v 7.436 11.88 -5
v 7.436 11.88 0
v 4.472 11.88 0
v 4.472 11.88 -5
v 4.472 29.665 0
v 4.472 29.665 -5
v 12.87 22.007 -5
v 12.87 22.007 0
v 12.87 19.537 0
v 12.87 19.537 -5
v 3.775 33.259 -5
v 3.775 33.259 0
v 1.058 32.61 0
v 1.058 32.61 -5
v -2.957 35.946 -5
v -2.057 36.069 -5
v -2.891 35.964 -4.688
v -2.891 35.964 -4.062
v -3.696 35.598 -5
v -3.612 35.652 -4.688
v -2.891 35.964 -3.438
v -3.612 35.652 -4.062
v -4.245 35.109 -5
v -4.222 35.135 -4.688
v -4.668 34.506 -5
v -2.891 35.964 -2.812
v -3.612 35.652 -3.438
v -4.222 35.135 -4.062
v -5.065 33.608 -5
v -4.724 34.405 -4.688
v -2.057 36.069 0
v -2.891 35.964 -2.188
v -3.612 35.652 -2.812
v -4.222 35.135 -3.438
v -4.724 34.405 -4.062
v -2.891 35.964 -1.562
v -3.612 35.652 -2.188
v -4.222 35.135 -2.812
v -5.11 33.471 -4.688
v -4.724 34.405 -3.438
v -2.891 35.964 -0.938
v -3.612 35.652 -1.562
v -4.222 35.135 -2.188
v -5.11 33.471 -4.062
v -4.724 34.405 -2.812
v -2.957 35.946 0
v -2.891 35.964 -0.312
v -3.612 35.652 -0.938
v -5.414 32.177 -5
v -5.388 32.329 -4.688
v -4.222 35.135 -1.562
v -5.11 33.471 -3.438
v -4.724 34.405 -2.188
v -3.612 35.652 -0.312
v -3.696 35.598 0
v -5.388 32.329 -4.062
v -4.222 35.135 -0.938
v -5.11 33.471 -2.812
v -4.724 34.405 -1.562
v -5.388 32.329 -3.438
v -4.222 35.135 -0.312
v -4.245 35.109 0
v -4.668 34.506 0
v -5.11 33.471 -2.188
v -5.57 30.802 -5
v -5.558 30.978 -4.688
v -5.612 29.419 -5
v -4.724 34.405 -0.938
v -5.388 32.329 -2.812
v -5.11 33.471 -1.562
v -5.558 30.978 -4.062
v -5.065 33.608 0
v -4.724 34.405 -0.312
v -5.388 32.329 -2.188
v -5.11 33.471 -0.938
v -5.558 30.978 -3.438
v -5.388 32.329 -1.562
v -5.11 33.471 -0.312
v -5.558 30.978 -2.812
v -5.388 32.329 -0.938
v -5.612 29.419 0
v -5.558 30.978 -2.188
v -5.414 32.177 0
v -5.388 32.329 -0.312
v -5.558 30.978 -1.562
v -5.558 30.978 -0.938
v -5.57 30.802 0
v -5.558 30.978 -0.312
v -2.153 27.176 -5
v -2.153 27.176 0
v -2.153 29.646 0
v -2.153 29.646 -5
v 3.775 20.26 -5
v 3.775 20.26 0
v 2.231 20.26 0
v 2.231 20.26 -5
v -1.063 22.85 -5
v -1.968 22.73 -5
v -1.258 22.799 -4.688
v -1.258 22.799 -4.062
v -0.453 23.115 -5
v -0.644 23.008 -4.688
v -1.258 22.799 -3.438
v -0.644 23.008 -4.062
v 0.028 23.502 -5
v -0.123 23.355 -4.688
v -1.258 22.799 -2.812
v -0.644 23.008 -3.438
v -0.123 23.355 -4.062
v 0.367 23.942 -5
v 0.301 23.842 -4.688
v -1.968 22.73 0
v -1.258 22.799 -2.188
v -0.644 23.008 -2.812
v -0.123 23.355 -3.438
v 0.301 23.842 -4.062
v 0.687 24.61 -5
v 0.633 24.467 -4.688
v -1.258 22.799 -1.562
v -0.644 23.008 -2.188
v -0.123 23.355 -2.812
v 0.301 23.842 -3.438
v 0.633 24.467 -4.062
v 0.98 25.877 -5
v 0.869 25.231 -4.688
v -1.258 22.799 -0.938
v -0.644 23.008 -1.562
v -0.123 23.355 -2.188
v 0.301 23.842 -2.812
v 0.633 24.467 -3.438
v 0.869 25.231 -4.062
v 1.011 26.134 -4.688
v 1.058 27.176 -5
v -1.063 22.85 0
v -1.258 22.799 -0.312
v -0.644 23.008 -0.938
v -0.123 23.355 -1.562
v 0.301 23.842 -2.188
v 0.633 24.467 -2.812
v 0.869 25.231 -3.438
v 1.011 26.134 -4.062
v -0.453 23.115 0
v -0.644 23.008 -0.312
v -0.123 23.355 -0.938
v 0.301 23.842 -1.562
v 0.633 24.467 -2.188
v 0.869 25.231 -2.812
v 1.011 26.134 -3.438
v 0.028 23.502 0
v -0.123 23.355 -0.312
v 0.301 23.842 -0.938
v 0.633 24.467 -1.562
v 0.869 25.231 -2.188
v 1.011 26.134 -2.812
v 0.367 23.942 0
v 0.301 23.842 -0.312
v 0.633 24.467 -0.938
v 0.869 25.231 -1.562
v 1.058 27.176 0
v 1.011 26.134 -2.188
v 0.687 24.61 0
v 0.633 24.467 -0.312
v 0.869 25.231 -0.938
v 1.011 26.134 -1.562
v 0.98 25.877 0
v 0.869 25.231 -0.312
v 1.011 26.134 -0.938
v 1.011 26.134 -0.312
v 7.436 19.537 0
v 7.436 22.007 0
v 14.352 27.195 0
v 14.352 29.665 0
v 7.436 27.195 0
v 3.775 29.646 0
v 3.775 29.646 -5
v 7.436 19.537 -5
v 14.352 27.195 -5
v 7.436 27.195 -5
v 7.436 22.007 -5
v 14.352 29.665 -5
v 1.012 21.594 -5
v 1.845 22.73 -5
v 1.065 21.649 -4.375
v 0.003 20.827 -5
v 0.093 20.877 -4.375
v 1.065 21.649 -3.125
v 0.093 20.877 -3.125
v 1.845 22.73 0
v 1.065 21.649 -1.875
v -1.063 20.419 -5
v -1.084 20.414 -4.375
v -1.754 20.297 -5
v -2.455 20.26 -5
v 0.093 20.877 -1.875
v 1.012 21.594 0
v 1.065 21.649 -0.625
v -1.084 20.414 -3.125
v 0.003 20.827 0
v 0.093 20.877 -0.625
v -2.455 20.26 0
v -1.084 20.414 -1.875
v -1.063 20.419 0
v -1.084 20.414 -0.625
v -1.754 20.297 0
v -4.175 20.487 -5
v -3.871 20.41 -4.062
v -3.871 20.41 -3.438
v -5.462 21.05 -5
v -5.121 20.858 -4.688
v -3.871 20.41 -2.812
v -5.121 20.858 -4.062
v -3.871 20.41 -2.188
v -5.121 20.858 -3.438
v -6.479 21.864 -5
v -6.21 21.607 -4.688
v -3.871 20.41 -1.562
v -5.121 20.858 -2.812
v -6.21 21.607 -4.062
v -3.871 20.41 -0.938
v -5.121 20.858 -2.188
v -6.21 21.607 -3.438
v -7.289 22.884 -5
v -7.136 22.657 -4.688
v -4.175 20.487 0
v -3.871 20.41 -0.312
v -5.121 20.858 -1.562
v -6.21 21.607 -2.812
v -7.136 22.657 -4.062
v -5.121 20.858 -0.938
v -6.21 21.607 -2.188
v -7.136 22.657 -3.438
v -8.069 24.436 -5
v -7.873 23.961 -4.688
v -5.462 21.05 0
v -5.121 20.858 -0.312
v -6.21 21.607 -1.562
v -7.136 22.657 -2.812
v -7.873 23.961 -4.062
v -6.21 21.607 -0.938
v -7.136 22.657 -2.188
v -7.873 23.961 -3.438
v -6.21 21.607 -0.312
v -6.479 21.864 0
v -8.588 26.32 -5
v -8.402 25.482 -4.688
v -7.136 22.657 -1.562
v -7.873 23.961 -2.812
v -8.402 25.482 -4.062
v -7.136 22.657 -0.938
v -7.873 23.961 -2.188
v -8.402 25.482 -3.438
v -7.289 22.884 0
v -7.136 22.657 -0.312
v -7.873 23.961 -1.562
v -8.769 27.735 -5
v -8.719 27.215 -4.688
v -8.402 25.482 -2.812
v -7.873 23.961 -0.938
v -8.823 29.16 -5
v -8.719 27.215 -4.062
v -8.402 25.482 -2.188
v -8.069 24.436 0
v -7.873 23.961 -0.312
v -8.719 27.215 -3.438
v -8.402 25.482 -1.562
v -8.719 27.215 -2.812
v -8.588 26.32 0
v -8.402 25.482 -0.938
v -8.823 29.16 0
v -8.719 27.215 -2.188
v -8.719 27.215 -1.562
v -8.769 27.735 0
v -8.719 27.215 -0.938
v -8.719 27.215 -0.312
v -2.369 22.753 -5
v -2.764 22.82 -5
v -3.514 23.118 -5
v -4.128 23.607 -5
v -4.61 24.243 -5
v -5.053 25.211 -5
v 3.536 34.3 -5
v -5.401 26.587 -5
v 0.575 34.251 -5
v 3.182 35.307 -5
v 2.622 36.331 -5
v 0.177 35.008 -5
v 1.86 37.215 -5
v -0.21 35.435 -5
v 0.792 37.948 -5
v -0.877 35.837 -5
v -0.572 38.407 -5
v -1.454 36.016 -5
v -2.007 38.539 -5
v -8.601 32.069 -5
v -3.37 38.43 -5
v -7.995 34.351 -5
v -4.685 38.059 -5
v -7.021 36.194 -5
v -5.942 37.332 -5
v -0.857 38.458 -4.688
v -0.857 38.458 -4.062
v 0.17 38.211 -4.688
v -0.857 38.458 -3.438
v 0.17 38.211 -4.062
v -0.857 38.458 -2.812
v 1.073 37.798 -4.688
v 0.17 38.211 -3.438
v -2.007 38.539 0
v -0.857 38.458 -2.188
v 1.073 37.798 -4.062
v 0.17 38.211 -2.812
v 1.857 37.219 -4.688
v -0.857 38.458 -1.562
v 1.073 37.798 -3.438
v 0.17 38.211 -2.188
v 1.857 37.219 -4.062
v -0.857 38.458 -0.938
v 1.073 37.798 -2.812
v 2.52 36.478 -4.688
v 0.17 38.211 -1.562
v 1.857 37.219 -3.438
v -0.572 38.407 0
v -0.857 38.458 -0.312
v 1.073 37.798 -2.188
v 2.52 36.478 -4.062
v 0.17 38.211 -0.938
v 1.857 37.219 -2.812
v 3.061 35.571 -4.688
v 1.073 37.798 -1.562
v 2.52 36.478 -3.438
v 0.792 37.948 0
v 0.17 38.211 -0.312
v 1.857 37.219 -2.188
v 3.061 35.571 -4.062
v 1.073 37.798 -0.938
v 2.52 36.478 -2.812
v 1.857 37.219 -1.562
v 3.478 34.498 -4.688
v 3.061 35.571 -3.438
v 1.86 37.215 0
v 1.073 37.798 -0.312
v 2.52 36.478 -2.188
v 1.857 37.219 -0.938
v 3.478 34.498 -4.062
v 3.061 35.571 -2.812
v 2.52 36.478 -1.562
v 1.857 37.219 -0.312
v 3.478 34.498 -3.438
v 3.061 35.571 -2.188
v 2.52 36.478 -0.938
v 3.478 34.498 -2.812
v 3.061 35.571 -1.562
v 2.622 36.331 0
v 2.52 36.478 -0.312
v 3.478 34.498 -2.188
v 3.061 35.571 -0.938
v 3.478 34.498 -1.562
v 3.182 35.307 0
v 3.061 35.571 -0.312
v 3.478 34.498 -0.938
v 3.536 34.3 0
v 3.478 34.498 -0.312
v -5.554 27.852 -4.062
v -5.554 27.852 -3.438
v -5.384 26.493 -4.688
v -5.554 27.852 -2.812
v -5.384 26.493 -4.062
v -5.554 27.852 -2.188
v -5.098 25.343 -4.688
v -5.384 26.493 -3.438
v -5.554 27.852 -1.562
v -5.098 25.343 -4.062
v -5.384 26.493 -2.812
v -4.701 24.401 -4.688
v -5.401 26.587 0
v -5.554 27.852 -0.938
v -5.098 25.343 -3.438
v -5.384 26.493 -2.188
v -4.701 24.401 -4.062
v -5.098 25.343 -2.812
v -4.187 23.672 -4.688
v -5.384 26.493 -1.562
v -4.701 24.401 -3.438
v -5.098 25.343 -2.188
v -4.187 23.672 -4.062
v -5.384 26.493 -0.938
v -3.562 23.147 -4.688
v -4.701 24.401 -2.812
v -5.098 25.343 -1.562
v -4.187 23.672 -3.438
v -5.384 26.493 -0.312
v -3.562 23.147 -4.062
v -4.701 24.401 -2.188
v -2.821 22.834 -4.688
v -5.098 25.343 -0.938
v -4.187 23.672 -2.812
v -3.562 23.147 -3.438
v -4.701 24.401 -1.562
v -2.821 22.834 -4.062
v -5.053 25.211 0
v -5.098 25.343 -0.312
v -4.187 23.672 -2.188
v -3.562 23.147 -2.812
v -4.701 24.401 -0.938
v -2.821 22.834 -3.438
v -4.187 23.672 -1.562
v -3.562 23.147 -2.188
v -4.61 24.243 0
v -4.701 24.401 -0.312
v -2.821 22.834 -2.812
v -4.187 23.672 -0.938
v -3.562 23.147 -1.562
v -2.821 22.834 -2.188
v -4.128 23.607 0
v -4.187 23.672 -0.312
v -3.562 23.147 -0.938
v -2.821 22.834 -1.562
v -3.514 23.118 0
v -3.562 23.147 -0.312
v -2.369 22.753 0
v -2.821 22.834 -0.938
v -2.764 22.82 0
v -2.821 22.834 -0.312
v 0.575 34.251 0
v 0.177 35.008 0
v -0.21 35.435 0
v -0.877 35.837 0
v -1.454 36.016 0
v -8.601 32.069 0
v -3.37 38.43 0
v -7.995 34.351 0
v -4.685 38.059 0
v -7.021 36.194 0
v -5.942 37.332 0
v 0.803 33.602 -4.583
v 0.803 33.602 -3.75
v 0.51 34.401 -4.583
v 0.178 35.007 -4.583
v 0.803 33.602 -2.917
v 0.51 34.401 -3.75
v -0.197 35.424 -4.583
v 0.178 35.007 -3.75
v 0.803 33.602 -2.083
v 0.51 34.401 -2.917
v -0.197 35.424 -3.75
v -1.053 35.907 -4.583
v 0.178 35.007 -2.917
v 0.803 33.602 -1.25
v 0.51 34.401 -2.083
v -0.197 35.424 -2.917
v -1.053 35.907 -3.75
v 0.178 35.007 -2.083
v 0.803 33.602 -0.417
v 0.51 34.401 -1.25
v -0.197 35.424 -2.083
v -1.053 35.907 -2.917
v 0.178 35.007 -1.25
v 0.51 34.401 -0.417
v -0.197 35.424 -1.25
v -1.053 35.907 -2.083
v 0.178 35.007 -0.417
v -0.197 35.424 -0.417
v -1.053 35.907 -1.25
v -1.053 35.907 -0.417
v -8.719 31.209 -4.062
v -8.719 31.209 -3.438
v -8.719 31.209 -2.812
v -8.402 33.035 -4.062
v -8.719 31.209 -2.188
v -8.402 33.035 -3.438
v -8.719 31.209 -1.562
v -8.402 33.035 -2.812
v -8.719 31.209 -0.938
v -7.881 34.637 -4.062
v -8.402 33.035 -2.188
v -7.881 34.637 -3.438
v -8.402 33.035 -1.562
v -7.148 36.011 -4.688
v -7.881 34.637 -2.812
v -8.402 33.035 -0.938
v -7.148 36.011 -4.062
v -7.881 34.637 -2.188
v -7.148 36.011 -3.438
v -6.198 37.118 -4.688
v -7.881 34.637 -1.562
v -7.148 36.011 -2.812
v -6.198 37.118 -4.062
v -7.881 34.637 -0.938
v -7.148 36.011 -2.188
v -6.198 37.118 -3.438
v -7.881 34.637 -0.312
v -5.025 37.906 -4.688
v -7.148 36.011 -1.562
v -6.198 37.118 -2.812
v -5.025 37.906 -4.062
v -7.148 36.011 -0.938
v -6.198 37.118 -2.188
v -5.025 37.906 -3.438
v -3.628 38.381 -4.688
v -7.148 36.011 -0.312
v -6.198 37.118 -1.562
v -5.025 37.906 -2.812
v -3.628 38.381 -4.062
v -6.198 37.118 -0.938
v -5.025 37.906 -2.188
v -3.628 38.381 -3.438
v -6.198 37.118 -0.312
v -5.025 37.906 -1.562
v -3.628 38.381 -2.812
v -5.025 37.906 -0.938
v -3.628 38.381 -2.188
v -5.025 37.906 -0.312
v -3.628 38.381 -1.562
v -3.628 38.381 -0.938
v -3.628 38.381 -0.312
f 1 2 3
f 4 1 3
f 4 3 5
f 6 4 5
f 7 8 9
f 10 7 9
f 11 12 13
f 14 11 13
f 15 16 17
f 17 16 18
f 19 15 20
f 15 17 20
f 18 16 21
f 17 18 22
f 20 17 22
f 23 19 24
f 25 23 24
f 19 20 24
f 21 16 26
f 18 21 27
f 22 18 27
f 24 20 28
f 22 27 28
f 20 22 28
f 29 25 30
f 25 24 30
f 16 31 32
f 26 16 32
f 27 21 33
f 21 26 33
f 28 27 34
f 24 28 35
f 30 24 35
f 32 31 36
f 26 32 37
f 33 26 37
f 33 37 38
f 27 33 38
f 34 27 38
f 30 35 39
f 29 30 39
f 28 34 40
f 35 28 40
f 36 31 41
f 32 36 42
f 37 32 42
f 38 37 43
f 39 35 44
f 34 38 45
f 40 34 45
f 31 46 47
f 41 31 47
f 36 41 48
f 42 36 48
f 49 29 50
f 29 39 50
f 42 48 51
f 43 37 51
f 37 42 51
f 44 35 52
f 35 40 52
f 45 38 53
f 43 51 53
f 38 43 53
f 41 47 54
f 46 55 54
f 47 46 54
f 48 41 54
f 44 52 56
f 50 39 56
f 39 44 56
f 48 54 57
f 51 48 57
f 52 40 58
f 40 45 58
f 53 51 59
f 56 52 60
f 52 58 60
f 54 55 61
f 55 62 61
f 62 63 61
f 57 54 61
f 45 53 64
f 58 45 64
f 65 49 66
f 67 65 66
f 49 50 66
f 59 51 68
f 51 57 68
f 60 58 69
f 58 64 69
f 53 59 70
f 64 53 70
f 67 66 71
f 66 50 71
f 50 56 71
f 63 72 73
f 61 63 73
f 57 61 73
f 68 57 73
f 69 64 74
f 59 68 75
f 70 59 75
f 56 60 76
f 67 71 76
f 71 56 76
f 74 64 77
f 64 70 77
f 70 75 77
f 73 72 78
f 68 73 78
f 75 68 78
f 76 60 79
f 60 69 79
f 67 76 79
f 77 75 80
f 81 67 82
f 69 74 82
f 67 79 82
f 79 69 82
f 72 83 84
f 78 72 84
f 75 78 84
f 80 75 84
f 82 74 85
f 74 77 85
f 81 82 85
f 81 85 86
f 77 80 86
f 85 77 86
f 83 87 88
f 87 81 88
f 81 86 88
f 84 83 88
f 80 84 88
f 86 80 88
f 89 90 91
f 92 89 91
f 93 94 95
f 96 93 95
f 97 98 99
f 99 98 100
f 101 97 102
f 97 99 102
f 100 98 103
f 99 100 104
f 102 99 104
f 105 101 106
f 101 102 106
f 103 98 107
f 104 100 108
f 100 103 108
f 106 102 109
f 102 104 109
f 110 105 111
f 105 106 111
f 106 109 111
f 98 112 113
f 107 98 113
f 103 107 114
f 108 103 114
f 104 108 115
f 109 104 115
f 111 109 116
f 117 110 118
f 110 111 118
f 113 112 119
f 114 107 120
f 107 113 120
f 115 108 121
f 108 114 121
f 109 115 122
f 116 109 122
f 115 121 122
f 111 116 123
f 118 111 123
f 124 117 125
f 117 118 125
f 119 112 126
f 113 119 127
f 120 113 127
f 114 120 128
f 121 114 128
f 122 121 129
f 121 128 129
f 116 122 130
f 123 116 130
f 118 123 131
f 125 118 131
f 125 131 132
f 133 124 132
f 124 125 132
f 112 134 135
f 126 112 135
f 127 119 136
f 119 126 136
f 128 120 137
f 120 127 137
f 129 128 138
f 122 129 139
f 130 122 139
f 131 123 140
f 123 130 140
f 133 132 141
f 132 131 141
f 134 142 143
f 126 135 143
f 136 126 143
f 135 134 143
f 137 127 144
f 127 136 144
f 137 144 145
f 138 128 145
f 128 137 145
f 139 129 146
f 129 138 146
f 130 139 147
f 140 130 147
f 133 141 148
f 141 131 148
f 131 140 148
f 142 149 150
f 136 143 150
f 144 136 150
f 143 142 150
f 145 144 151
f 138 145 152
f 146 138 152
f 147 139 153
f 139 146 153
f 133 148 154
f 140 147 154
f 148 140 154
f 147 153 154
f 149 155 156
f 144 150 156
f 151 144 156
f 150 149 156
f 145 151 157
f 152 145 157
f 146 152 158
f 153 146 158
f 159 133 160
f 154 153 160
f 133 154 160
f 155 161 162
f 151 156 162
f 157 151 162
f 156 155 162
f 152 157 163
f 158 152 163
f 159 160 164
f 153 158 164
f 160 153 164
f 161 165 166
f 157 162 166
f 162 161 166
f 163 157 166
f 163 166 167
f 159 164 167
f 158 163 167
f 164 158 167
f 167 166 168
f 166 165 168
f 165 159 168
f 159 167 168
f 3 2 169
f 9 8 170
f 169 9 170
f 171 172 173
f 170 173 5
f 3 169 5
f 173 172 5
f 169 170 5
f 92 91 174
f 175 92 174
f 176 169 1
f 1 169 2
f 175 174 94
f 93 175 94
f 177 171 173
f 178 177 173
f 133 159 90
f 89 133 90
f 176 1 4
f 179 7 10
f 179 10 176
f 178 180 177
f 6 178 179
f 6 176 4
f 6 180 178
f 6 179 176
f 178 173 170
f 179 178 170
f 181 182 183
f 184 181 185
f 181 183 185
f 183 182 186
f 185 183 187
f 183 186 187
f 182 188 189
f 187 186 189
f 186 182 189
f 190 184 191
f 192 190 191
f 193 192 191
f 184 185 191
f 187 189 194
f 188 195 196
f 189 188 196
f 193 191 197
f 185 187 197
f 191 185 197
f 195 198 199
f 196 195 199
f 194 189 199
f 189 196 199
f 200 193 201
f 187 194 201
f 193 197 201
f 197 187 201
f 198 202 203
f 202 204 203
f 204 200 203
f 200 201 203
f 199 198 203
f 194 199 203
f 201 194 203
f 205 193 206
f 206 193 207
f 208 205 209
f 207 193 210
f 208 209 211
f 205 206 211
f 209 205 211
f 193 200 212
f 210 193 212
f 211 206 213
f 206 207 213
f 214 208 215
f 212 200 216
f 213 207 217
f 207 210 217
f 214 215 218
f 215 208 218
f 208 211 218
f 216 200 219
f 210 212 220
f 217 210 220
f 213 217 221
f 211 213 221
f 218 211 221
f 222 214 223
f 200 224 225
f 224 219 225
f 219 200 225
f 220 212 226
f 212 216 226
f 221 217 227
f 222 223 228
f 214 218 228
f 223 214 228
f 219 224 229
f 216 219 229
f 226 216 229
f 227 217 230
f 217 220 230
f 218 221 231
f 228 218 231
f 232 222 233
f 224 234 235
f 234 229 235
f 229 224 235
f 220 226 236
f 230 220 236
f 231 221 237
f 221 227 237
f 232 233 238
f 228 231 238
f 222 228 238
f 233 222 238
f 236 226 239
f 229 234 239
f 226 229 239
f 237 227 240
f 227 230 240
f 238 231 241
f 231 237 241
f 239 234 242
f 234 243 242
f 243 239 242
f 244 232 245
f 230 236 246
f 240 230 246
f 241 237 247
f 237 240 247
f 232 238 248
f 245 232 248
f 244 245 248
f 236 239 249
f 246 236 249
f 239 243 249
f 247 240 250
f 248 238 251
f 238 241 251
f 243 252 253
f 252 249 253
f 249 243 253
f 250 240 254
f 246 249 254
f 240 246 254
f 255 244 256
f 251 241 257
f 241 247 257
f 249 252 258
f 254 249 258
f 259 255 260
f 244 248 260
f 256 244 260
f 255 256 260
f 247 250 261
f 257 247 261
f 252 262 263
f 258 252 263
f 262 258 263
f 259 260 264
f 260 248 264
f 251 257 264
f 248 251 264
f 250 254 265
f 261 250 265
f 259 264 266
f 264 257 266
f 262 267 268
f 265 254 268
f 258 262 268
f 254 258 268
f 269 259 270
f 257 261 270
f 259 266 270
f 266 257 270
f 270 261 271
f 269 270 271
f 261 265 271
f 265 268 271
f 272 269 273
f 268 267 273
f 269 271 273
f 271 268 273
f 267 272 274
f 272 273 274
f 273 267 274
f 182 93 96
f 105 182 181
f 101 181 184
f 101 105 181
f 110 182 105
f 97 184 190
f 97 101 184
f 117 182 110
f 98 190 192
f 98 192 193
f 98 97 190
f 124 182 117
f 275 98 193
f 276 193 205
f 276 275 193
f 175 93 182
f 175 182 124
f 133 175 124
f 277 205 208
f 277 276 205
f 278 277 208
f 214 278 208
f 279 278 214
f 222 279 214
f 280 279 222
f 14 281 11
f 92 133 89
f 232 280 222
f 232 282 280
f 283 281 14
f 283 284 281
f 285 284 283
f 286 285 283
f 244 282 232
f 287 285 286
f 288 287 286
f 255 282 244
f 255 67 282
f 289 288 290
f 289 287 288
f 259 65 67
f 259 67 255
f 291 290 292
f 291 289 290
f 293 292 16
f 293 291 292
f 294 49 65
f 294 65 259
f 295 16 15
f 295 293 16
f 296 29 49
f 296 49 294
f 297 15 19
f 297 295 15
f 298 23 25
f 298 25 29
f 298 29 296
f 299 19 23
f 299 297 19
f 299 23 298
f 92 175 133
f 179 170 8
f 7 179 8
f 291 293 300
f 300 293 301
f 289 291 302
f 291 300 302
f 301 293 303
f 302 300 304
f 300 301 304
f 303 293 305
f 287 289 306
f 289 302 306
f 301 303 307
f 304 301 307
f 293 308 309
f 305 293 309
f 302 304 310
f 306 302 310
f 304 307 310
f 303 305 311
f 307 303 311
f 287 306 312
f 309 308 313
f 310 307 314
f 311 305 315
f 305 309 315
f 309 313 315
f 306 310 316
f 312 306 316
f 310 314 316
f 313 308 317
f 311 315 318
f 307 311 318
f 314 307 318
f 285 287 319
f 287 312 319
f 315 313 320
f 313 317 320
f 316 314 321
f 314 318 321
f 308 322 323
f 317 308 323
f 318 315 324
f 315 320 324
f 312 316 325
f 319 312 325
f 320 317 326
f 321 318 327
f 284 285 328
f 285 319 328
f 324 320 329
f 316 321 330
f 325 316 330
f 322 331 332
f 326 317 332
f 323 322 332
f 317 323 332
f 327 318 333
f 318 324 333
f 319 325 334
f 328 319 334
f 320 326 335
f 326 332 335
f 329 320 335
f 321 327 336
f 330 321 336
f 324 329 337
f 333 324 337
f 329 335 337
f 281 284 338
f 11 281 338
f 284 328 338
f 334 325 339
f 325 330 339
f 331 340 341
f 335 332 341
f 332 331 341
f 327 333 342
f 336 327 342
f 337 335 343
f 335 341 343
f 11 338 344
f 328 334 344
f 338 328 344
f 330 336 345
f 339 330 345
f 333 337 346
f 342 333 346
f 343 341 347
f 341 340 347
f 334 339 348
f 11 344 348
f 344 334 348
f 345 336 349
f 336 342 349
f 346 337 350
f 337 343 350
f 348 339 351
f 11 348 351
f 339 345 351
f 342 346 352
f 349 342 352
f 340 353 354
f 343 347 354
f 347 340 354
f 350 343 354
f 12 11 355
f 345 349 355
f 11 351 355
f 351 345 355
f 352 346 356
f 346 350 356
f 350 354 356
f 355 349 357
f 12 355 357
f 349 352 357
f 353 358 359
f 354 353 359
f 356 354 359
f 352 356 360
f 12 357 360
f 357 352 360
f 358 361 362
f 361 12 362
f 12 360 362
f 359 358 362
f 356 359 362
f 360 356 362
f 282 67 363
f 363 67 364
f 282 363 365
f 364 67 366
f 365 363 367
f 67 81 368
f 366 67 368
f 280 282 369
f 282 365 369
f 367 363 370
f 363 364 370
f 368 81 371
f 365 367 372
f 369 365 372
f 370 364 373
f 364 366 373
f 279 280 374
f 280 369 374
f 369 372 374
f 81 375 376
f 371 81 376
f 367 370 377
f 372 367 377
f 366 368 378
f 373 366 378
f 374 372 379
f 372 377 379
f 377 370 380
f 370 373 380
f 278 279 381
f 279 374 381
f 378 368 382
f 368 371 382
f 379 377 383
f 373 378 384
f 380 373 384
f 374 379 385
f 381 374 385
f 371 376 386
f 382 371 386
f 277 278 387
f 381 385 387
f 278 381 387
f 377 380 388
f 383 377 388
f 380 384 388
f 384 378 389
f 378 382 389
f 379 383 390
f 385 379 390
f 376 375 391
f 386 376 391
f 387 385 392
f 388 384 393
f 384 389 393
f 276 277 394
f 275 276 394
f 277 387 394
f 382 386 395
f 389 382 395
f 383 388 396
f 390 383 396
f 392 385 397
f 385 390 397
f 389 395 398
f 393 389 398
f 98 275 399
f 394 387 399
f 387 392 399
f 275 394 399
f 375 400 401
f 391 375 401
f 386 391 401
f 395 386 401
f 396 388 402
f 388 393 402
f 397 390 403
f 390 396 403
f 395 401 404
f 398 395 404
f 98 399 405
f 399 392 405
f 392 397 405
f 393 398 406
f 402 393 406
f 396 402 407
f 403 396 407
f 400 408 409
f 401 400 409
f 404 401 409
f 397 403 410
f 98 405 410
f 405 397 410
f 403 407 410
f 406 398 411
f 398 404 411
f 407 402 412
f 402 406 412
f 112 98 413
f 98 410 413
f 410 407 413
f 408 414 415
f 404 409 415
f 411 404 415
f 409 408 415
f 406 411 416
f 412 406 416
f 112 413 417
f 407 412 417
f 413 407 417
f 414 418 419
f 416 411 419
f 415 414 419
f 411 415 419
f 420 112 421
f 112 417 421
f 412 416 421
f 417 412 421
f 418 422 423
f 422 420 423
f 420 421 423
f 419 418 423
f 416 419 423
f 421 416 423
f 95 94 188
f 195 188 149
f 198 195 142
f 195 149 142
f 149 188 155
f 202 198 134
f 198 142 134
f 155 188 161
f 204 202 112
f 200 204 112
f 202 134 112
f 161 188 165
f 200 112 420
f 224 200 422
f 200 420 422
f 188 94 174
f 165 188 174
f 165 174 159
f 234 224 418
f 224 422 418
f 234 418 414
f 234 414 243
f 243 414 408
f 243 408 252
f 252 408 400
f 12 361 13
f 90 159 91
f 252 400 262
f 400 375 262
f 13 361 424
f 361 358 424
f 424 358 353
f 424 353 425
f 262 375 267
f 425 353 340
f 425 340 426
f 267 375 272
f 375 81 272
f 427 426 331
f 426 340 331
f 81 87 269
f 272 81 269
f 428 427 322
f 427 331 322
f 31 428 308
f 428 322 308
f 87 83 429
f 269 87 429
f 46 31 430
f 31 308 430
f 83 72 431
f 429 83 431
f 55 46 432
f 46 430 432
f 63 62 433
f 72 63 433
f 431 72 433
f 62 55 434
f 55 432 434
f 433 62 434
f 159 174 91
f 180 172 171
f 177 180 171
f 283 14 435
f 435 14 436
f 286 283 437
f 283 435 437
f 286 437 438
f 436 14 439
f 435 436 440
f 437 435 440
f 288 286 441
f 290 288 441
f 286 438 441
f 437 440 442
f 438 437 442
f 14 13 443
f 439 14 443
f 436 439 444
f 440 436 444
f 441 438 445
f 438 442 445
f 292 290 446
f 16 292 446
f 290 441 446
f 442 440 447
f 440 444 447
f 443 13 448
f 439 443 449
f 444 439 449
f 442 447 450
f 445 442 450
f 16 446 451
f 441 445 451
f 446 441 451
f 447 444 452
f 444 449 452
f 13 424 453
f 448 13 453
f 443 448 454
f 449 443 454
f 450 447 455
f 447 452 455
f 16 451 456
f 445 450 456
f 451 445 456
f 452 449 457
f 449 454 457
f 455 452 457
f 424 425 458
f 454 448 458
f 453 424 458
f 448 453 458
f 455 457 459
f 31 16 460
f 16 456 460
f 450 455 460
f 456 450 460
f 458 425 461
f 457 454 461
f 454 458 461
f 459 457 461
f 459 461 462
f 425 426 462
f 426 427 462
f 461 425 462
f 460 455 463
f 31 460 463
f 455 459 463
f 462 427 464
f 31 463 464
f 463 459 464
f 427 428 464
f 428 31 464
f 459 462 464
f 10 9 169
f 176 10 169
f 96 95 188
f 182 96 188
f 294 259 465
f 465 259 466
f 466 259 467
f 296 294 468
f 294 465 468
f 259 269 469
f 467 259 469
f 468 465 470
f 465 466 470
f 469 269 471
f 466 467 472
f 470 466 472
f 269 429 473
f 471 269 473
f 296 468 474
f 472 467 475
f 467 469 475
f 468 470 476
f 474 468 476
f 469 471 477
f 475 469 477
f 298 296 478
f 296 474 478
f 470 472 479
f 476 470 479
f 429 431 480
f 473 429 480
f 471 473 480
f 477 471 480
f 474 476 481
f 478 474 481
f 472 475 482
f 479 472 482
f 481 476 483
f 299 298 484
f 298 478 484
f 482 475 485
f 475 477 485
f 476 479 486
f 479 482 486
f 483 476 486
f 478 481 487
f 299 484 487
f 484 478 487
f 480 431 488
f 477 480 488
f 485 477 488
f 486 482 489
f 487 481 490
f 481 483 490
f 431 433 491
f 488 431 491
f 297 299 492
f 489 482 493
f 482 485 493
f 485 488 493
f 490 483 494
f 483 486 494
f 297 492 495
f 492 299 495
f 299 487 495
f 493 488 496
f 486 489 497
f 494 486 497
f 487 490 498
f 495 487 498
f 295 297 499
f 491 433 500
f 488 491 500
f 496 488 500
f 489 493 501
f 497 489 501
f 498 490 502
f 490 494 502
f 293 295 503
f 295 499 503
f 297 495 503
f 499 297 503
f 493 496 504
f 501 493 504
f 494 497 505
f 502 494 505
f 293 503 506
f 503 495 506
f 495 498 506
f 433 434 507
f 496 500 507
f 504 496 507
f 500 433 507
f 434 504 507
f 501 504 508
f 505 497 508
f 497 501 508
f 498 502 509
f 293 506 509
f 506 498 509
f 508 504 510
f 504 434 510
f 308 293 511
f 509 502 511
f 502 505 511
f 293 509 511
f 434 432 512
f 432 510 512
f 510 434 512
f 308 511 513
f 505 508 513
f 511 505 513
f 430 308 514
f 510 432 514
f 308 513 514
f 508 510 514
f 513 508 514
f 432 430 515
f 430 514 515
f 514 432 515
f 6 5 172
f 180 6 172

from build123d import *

# Parameters (mm, degrees)
BOSS_EXTRUDE1_DEPTH   = 5
BOSS_EXTRUDE1_2_DEPTH = 5


with BuildPart() as part:
    # Sketch1 → Boss-Extrude1 (new body)
    with BuildSketch(Plane.XY):
        with BuildLine():
            Line((-2.153470948, 29.646336052), (3.774849364, 29.646336052))
            Line((3.774849364, 29.646336052), (3.774849364, 20.25982889))
            Line((3.774849364, 20.25982889), (2.231015949, 20.25982889))
            Line((2.231015949, 20.25982889), (1.845057596, 22.729962354))
            add(Edge.make_bspline(
                [(1.845057596, 22.729962354), (1.729525903, 22.533304465), (1.503690818, 22.148888294), (1.080558094, 21.64563251), (0.614887351, 21.215397775), (0.098449936, 20.861989165), (-0.470978389, 20.59070171), (-1.089712716, 20.398862088), (-1.756542389, 20.280088735), (-2.217285213, 20.266714956), (-2.454518464, 20.25982889)],
                knots=[0, 0, 0, 0, 1.045094897, 2.042894806, 3.00396893, 3.947178755, 4.9030891, 5.887118072, 6.9120919, 8, 8, 8, 8], degree=3))
            add(Edge.make_bspline(
                [(-2.454518464, 20.25982889), (-2.698130672, 20.267113832), (-3.173876929, 20.281340473), (-3.865569565, 20.396116702), (-4.517165489, 20.580501886), (-5.128450967, 20.845286717), (-5.697036574, 21.186540071), (-6.225022821, 21.601219562), (-6.709406437, 22.092515395), (-7.15098965, 22.655095858), (-7.543326313, 23.282859382), (-7.88847734, 23.964362978), (-8.17649002, 24.702002757), (-8.415702521, 25.490301095), (-8.600828997, 26.332985286), (-8.729665047, 27.228220065), (-8.807362473, 28.177030046), (-8.8175854, 28.826667007), (-8.8228313, 29.160028526)],
                knots=[0, 0, 0, 0, 0.949721203, 1.854694852, 2.72662243, 3.585163148, 4.444876216, 5.306169425, 6.196783289, 7.129381836, 8.090003596, 9.07966204, 10.104665789, 11.174562855, 12.289781402, 13.466383582, 14.699873518, 16, 16, 16, 16], degree=3))
            add(Edge.make_bspline(
                [(-8.8228313, 29.160028526), (-8.817591801, 29.511394704), (-8.807387464, 30.195708017), (-8.729749384, 31.194594037), (-8.600883803, 32.137344421), (-8.41506872, 33.024328597), (-8.181037172, 33.855586008), (-7.896776275, 34.631630559), (-7.555402518, 35.349827452), (-7.16346701, 36.011365884), (-6.717945821, 36.608718924), (-6.212357575, 37.128925948), (-5.646749532, 37.564025711), (-5.026780123, 37.922760562), (-4.350603128, 38.201889817), (-3.61739057, 38.396570378), (-2.830467553, 38.519413614), (-2.286456936, 38.532228825), (-2.006806774, 38.53881652)],
                knots=[0, 0, 0, 0, 1.283507334, 2.49973165, 3.657598748, 4.757275942, 5.807648446, 6.809917029, 7.772764068, 8.708573029, 9.614724818, 10.488826572, 11.349943626, 12.213315118, 13.098354007, 14.013879131, 14.979029073, 16, 16, 16, 16], degree=3))
            add(Edge.make_bspline(
                [(-2.006806774, 38.53881652), (-1.809819511, 38.535508623), (-1.425112074, 38.529048445), (-0.864469996, 38.467256454), (-0.334854164, 38.360460256), (0.167928351, 38.222922542), (0.635266636, 38.028798301), (1.077673649, 37.807663901), (1.482767559, 37.532751211), (1.864512748, 37.224683434), (2.211085183, 36.870383281), (2.532802388, 36.479569395), (2.80885929, 36.038571734), (3.07395713, 35.56754015), (3.293545827, 35.0480383), (3.487617172, 34.489979216), (3.649367029, 33.889777833), (3.732263829, 33.473008126), (3.774849364, 33.258906242)],
                knots=[0, 0, 0, 0, 1.091721363, 2.132083677, 3.120913987, 4.084845068, 5.015843344, 5.921672224, 6.821642812, 7.723842905, 8.636607532, 9.564404469, 10.52381369, 11.516442864, 12.557758036, 13.644857496, 14.790122123, 16, 16, 16, 16], degree=3))
            Line((3.774849364, 33.258906242), (1.057702554, 32.610496208))
            add(Edge.make_bspline(
                [(1.057702554, 32.610496208), (1.017988506, 32.784541866), (0.942021599, 33.11746462), (0.810318891, 33.588658851), (0.673068245, 34.014139696), (0.519300746, 34.390094738), (0.358517036, 34.720067453), (0.188510465, 35.001815223), (0.007685514, 35.237165277), (-0.249559855, 35.481785215), (-0.599595416, 35.715739853), (-1.053009728, 35.921366653), (-1.543117531, 36.049375699), (-1.883815084, 36.062176697), (-2.05698136, 36.068683057)],
                knots=[0, 0, 0, 0, 1.250986768, 2.392946557, 3.427986007, 4.382396444, 5.237274797, 5.998106545, 6.685332127, 7.310289116, 8.478224255, 9.61622589, 10.788399614, 12, 12, 12, 12], degree=3))
            add(Edge.make_bspline(
                [(-2.05698136, 36.068683057), (-2.201420728, 36.06348151), (-2.482173943, 36.053371032), (-2.88941867, 35.97506005), (-3.267368794, 35.842647097), (-3.618144352, 35.659143032), (-3.942849997, 35.426227394), (-4.233923149, 35.133821934), (-4.500963596, 34.79390284), (-4.735285923, 34.39931385), (-4.945757205, 33.956931418), (-5.118712319, 33.459687093), (-5.276062166, 32.914350106), (-5.394404588, 32.314526456), (-5.497156277, 31.664803884), (-5.564409957, 30.96238493), (-5.601477087, 30.207670726), (-5.608187971, 29.6875475), (-5.611657797, 29.418620623)],
                knots=[0, 0, 0, 0, 0.822034536, 1.597825046, 2.350764774, 3.094526339, 3.844753019, 4.61655611, 5.435713419, 6.300036831, 7.224070609, 8.220419235, 9.294044468, 10.453410731, 11.698711865, 13.038421064, 14.468731767, 16, 16, 16, 16], degree=3))
            add(Edge.make_bspline(
                [(-5.611657797, 29.418620623), (-5.608661649, 29.148383698), (-5.602865204, 28.625574554), (-5.559380712, 27.867257416), (-5.493209044, 27.160938567), (-5.391682829, 26.506770655), (-5.26774952, 25.903676588), (-5.108619158, 25.353271445), (-4.925035604, 24.854286683), (-4.714228102, 24.406250115), (-4.469317297, 24.013479246), (-4.198298686, 23.670696762), (-3.900050103, 23.376452501), (-3.56889437, 23.139005258), (-3.208148239, 22.955263782), (-2.819700703, 22.823653617), (-2.402306839, 22.745532323), (-2.115209768, 22.735234846), (-1.968210939, 22.729962354)],
                knots=[0, 0, 0, 0, 1.52120012, 2.94296322, 4.274736016, 5.513118187, 6.667950076, 7.738394961, 8.735258225, 9.658498985, 10.520629887, 11.33501632, 12.113508884, 12.871241548, 13.619465388, 14.384432105, 15.172800375, 16, 16, 16, 16], degree=3))
            add(Edge.make_bspline(
                [(-1.968210939, 22.729962354), (-1.845878257, 22.734275072), (-1.607883105, 22.742665358), (-1.262237884, 22.790063864), (-0.942846742, 22.883006843), (-0.642381739, 22.998328917), (-0.371376572, 23.162517133), (-0.115938958, 23.349317682), (0.106330913, 23.581560706), (0.311130739, 23.842365285), (0.485650064, 24.141280533), (0.643661708, 24.471749854), (0.765807345, 24.840169648), (0.878029531, 25.239620688), (0.953647604, 25.675820047), (1.018500834, 26.145308167), (1.051002391, 26.649555044), (1.05542703, 26.997341353), (1.057702554, 27.176202588)],
                knots=[0, 0, 0, 0, 0.962390101, 1.872305717, 2.733866052, 3.573589864, 4.394267886, 5.217746971, 6.054724087, 6.912713418, 7.820094838, 8.770446228, 9.787838261, 10.867644684, 12.030373047, 13.265115176, 14.593490128, 16, 16, 16, 16], degree=3))
            Line((1.057702554, 27.176202588), (-2.153470948, 27.176202588))
            Line((-2.153470948, 27.176202588), (-2.153470948, 29.646336052))
        make_face()
    extrude(amount=-BOSS_EXTRUDE1_DEPTH)


with BuildPart() as body_2:
    # Sketch1 → Boss-Extrude1 2 (new body)
    with BuildSketch(Plane.XY):
        Polygon((4.471875445, 29.664871557), (14.352409299, 29.664871557), (14.352409299, 27.194738094), (7.436035601, 27.194738094), (7.436035601, 22.007457821), (12.870329221, 22.007457821), (12.870329221, 19.537324357), (7.436035601, 19.537324357), (7.436035601, 11.87991062), (4.471875445, 11.87991062), align=None)
    extrude(amount=-BOSS_EXTRUDE1_2_DEPTH)


solid = Compound([part.part, body_2.part])
